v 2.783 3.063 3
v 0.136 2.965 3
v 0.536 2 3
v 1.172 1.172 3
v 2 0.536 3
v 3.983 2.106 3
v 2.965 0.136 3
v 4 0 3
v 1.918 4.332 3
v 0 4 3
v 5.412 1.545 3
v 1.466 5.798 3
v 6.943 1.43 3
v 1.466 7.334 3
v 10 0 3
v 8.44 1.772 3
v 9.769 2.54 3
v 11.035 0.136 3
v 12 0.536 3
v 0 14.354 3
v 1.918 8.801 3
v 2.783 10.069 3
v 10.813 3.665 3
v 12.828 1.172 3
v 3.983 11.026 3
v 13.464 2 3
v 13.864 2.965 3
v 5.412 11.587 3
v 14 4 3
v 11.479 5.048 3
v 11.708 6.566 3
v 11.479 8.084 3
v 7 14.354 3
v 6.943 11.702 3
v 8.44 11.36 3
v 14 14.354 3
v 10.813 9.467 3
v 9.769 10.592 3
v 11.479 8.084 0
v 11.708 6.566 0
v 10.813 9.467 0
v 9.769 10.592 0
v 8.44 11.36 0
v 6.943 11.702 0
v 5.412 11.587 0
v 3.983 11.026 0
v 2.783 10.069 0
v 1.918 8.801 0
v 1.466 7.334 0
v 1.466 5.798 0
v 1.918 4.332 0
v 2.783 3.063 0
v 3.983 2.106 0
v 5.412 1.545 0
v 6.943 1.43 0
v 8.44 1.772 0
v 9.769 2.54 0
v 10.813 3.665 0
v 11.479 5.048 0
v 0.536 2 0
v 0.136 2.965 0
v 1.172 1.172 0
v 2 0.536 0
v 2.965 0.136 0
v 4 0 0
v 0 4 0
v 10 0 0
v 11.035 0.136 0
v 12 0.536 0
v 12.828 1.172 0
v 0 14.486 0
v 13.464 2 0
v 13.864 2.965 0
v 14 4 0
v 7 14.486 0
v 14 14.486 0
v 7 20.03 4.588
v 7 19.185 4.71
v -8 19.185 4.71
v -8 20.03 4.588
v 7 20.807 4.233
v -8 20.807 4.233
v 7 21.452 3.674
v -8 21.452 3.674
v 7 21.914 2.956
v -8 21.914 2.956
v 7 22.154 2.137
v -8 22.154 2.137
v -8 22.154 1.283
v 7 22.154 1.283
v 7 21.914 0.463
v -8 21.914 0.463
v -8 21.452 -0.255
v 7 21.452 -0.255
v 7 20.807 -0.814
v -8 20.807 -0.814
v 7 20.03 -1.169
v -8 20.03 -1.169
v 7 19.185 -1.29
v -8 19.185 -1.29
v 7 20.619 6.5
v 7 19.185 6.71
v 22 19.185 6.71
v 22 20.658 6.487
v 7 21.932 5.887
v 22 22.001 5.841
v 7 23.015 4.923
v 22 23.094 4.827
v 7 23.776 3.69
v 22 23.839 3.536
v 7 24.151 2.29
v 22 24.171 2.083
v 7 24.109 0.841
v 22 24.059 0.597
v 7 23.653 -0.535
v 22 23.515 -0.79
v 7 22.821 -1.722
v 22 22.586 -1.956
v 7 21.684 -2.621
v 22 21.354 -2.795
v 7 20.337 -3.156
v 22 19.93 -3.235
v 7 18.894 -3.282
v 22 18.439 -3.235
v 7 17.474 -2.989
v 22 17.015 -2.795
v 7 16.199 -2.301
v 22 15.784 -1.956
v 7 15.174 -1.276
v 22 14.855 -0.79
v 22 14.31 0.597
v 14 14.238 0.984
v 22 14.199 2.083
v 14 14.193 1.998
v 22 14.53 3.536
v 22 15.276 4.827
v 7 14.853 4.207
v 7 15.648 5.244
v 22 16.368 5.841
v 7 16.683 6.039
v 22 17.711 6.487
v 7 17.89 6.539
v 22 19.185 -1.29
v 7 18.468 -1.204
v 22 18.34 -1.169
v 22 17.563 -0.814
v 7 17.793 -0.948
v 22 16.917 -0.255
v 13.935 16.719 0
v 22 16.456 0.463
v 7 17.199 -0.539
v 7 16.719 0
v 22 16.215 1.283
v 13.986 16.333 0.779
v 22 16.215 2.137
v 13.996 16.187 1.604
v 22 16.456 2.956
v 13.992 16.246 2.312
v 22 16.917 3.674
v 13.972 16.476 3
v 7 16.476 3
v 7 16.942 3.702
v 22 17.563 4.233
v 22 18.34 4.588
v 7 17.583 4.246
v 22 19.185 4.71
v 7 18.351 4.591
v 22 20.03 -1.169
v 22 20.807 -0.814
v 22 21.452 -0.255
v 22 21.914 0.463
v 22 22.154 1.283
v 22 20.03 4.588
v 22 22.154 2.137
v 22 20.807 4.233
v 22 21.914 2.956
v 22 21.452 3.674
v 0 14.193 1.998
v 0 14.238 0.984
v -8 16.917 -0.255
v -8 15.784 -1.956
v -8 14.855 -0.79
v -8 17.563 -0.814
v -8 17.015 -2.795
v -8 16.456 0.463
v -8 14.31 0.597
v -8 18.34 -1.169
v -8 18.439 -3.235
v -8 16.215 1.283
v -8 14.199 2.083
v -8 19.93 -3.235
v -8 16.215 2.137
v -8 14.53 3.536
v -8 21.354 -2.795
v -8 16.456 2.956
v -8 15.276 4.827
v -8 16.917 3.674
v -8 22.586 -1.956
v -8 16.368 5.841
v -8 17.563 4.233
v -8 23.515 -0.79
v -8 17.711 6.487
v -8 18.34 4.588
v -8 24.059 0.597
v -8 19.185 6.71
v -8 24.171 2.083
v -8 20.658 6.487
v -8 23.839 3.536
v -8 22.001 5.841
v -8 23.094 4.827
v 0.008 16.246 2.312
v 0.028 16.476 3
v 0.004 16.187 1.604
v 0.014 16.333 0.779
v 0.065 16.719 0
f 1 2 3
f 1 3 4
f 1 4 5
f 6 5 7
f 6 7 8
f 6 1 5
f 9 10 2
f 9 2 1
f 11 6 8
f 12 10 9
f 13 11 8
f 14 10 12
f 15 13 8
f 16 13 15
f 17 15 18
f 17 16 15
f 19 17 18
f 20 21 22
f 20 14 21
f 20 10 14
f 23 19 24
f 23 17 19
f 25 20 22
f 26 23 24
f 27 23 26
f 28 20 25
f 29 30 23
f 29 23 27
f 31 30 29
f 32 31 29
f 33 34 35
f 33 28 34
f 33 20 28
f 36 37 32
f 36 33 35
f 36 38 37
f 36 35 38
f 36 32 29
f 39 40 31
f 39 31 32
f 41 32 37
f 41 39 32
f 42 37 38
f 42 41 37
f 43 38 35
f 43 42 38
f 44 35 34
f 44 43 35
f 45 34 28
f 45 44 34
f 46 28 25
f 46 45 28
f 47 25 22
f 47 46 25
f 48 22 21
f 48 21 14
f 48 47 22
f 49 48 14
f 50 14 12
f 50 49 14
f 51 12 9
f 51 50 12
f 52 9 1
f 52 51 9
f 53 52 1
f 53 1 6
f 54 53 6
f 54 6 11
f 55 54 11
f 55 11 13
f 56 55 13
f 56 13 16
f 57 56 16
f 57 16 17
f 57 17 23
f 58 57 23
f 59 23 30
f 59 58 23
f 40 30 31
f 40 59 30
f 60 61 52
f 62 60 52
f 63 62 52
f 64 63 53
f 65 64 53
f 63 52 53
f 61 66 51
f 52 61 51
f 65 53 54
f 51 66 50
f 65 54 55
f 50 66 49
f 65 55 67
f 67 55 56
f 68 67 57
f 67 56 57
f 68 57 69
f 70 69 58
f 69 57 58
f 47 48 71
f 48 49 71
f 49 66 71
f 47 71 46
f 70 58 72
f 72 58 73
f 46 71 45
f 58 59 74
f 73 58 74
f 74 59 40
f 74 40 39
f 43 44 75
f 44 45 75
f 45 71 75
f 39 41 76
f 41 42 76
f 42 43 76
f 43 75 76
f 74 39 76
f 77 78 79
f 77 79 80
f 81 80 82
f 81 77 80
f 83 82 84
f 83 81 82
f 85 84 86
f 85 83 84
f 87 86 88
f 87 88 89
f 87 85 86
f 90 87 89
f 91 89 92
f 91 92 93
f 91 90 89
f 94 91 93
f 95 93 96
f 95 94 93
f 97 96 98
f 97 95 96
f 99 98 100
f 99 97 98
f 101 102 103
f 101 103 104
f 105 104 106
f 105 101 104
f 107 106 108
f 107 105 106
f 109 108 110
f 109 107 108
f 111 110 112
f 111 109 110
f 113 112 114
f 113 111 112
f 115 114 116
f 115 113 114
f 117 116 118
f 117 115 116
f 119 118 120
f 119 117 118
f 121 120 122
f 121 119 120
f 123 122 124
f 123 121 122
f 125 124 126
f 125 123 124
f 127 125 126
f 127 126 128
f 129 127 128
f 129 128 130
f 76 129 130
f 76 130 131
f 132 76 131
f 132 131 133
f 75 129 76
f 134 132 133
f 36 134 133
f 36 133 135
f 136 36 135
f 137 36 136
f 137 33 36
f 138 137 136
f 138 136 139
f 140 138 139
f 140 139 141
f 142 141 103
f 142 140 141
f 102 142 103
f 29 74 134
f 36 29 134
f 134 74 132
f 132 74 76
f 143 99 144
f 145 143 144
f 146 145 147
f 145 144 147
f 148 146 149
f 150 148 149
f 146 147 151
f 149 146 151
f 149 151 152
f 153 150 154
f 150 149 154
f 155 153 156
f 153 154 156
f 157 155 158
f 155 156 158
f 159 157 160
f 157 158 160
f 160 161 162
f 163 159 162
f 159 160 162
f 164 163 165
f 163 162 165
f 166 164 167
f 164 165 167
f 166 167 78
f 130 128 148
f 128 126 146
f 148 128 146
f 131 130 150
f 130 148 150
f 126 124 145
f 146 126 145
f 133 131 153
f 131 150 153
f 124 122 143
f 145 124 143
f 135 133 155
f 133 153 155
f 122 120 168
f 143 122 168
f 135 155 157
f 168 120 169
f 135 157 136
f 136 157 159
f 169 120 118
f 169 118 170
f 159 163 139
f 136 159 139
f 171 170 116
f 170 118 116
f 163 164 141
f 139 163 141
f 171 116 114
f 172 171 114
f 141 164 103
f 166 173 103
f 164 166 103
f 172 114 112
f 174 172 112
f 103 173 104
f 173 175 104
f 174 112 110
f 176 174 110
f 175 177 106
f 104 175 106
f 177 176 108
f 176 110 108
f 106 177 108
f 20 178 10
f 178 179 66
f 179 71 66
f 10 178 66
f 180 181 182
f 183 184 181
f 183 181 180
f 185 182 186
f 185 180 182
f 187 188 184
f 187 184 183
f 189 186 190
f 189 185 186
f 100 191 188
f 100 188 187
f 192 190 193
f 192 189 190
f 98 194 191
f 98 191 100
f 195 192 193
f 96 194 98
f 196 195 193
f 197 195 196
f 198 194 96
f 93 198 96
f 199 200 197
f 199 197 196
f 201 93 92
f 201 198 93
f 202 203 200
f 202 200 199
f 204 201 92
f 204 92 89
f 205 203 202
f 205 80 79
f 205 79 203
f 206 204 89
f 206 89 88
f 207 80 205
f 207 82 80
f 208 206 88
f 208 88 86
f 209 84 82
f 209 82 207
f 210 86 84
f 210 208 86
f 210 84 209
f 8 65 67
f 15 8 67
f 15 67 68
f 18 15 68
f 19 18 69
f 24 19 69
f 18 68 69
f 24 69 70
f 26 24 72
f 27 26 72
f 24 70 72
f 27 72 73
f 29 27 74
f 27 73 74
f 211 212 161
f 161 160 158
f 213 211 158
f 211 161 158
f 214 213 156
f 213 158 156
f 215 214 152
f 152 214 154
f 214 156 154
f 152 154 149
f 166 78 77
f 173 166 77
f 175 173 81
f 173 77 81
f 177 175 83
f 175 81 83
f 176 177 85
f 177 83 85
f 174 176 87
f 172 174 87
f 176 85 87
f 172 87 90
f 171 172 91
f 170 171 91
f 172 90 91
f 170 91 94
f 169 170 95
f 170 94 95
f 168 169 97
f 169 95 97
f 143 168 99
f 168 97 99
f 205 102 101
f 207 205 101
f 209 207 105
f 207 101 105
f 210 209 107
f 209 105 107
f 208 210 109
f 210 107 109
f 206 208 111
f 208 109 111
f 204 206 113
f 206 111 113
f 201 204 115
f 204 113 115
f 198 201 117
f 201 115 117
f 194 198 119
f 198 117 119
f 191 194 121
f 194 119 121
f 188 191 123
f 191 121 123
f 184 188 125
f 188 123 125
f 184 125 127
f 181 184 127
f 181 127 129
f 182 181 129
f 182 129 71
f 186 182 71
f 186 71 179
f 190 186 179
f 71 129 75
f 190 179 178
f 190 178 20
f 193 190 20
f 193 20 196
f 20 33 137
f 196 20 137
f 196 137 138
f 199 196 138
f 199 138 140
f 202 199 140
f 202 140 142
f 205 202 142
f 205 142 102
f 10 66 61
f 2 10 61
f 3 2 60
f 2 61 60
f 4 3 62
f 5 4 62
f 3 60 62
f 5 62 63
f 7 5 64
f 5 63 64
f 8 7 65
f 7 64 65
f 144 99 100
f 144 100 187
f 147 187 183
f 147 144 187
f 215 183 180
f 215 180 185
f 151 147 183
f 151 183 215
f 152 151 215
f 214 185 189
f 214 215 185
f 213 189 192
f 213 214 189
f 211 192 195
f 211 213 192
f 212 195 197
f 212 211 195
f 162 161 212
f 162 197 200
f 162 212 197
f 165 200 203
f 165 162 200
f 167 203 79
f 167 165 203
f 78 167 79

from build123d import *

# Parameters (mm, degrees)
SKETCH2_R                = 5.15
BOSS_EXTRUDE1_DEPTH      = 3
SKETCH3_R                = 5
SKETCH3_R_2              = 3
BOSS_EXTRUDE2_DEPTH      = 15
BOSS_EXTRUDE2_DEPTH_BACK = 15
SKETCH5_R                = 3
CUT_EXTRUDE1_DEPTH       = 31.0000001


with BuildPart() as part:
    # Sketch2 → Boss-Extrude1 (new body)
    with BuildSketch(Plane.XY):
        with BuildLine():
            Line((4, 0), (10, 0))
            ThreePointArc((10, 0), (12.828427125, 1.171572875), (14, 4))
            Line((14, 4), (14, 16))
            ThreePointArc((14, 16), (12.828427125, 18.828427125), (10, 20))
            Line((10, 20), (4, 20))
            ThreePointArc((4, 20), (1.171572875, 18.828427125), (0, 16))
            Line((0, 16), (0, 4))
            ThreePointArc((0, 4), (1.171572875, 1.171572875), (4, 0))
        make_face()
        with Locations((6.558010351, 6.566011985)):
            Circle(SKETCH2_R, mode=Mode.SUBTRACT)
    extrude(amount=BOSS_EXTRUDE1_DEPTH)

    # Sketch3 → Boss-Extrude2 (add, two sides)
    with BuildSketch(Plane.ZY.offset(-7)) as boss_extrude2_sk:
        with Locations((1.709593121, 19.184703003)):
            Circle(SKETCH3_R)
        with Locations((1.709593121, 19.184703003)):
            Circle(SKETCH3_R_2, mode=Mode.SUBTRACT)
    extrude(amount=BOSS_EXTRUDE2_DEPTH)
    extrude(boss_extrude2_sk.sketch, amount=-BOSS_EXTRUDE2_DEPTH_BACK)

    # Sketch5 → Cut-Extrude1 (cut, through all)
    with BuildSketch(Plane(origin=(22, 0, 0), x_dir=(0, 0, -1), z_dir=(1, 0, 0))):
        with Locations((-1.709593121, 19.184703003)):
            Circle(SKETCH5_R)
    extrude(amount=-CUT_EXTRUDE1_DEPTH, mode=Mode.SUBTRACT)


solid = part.part
